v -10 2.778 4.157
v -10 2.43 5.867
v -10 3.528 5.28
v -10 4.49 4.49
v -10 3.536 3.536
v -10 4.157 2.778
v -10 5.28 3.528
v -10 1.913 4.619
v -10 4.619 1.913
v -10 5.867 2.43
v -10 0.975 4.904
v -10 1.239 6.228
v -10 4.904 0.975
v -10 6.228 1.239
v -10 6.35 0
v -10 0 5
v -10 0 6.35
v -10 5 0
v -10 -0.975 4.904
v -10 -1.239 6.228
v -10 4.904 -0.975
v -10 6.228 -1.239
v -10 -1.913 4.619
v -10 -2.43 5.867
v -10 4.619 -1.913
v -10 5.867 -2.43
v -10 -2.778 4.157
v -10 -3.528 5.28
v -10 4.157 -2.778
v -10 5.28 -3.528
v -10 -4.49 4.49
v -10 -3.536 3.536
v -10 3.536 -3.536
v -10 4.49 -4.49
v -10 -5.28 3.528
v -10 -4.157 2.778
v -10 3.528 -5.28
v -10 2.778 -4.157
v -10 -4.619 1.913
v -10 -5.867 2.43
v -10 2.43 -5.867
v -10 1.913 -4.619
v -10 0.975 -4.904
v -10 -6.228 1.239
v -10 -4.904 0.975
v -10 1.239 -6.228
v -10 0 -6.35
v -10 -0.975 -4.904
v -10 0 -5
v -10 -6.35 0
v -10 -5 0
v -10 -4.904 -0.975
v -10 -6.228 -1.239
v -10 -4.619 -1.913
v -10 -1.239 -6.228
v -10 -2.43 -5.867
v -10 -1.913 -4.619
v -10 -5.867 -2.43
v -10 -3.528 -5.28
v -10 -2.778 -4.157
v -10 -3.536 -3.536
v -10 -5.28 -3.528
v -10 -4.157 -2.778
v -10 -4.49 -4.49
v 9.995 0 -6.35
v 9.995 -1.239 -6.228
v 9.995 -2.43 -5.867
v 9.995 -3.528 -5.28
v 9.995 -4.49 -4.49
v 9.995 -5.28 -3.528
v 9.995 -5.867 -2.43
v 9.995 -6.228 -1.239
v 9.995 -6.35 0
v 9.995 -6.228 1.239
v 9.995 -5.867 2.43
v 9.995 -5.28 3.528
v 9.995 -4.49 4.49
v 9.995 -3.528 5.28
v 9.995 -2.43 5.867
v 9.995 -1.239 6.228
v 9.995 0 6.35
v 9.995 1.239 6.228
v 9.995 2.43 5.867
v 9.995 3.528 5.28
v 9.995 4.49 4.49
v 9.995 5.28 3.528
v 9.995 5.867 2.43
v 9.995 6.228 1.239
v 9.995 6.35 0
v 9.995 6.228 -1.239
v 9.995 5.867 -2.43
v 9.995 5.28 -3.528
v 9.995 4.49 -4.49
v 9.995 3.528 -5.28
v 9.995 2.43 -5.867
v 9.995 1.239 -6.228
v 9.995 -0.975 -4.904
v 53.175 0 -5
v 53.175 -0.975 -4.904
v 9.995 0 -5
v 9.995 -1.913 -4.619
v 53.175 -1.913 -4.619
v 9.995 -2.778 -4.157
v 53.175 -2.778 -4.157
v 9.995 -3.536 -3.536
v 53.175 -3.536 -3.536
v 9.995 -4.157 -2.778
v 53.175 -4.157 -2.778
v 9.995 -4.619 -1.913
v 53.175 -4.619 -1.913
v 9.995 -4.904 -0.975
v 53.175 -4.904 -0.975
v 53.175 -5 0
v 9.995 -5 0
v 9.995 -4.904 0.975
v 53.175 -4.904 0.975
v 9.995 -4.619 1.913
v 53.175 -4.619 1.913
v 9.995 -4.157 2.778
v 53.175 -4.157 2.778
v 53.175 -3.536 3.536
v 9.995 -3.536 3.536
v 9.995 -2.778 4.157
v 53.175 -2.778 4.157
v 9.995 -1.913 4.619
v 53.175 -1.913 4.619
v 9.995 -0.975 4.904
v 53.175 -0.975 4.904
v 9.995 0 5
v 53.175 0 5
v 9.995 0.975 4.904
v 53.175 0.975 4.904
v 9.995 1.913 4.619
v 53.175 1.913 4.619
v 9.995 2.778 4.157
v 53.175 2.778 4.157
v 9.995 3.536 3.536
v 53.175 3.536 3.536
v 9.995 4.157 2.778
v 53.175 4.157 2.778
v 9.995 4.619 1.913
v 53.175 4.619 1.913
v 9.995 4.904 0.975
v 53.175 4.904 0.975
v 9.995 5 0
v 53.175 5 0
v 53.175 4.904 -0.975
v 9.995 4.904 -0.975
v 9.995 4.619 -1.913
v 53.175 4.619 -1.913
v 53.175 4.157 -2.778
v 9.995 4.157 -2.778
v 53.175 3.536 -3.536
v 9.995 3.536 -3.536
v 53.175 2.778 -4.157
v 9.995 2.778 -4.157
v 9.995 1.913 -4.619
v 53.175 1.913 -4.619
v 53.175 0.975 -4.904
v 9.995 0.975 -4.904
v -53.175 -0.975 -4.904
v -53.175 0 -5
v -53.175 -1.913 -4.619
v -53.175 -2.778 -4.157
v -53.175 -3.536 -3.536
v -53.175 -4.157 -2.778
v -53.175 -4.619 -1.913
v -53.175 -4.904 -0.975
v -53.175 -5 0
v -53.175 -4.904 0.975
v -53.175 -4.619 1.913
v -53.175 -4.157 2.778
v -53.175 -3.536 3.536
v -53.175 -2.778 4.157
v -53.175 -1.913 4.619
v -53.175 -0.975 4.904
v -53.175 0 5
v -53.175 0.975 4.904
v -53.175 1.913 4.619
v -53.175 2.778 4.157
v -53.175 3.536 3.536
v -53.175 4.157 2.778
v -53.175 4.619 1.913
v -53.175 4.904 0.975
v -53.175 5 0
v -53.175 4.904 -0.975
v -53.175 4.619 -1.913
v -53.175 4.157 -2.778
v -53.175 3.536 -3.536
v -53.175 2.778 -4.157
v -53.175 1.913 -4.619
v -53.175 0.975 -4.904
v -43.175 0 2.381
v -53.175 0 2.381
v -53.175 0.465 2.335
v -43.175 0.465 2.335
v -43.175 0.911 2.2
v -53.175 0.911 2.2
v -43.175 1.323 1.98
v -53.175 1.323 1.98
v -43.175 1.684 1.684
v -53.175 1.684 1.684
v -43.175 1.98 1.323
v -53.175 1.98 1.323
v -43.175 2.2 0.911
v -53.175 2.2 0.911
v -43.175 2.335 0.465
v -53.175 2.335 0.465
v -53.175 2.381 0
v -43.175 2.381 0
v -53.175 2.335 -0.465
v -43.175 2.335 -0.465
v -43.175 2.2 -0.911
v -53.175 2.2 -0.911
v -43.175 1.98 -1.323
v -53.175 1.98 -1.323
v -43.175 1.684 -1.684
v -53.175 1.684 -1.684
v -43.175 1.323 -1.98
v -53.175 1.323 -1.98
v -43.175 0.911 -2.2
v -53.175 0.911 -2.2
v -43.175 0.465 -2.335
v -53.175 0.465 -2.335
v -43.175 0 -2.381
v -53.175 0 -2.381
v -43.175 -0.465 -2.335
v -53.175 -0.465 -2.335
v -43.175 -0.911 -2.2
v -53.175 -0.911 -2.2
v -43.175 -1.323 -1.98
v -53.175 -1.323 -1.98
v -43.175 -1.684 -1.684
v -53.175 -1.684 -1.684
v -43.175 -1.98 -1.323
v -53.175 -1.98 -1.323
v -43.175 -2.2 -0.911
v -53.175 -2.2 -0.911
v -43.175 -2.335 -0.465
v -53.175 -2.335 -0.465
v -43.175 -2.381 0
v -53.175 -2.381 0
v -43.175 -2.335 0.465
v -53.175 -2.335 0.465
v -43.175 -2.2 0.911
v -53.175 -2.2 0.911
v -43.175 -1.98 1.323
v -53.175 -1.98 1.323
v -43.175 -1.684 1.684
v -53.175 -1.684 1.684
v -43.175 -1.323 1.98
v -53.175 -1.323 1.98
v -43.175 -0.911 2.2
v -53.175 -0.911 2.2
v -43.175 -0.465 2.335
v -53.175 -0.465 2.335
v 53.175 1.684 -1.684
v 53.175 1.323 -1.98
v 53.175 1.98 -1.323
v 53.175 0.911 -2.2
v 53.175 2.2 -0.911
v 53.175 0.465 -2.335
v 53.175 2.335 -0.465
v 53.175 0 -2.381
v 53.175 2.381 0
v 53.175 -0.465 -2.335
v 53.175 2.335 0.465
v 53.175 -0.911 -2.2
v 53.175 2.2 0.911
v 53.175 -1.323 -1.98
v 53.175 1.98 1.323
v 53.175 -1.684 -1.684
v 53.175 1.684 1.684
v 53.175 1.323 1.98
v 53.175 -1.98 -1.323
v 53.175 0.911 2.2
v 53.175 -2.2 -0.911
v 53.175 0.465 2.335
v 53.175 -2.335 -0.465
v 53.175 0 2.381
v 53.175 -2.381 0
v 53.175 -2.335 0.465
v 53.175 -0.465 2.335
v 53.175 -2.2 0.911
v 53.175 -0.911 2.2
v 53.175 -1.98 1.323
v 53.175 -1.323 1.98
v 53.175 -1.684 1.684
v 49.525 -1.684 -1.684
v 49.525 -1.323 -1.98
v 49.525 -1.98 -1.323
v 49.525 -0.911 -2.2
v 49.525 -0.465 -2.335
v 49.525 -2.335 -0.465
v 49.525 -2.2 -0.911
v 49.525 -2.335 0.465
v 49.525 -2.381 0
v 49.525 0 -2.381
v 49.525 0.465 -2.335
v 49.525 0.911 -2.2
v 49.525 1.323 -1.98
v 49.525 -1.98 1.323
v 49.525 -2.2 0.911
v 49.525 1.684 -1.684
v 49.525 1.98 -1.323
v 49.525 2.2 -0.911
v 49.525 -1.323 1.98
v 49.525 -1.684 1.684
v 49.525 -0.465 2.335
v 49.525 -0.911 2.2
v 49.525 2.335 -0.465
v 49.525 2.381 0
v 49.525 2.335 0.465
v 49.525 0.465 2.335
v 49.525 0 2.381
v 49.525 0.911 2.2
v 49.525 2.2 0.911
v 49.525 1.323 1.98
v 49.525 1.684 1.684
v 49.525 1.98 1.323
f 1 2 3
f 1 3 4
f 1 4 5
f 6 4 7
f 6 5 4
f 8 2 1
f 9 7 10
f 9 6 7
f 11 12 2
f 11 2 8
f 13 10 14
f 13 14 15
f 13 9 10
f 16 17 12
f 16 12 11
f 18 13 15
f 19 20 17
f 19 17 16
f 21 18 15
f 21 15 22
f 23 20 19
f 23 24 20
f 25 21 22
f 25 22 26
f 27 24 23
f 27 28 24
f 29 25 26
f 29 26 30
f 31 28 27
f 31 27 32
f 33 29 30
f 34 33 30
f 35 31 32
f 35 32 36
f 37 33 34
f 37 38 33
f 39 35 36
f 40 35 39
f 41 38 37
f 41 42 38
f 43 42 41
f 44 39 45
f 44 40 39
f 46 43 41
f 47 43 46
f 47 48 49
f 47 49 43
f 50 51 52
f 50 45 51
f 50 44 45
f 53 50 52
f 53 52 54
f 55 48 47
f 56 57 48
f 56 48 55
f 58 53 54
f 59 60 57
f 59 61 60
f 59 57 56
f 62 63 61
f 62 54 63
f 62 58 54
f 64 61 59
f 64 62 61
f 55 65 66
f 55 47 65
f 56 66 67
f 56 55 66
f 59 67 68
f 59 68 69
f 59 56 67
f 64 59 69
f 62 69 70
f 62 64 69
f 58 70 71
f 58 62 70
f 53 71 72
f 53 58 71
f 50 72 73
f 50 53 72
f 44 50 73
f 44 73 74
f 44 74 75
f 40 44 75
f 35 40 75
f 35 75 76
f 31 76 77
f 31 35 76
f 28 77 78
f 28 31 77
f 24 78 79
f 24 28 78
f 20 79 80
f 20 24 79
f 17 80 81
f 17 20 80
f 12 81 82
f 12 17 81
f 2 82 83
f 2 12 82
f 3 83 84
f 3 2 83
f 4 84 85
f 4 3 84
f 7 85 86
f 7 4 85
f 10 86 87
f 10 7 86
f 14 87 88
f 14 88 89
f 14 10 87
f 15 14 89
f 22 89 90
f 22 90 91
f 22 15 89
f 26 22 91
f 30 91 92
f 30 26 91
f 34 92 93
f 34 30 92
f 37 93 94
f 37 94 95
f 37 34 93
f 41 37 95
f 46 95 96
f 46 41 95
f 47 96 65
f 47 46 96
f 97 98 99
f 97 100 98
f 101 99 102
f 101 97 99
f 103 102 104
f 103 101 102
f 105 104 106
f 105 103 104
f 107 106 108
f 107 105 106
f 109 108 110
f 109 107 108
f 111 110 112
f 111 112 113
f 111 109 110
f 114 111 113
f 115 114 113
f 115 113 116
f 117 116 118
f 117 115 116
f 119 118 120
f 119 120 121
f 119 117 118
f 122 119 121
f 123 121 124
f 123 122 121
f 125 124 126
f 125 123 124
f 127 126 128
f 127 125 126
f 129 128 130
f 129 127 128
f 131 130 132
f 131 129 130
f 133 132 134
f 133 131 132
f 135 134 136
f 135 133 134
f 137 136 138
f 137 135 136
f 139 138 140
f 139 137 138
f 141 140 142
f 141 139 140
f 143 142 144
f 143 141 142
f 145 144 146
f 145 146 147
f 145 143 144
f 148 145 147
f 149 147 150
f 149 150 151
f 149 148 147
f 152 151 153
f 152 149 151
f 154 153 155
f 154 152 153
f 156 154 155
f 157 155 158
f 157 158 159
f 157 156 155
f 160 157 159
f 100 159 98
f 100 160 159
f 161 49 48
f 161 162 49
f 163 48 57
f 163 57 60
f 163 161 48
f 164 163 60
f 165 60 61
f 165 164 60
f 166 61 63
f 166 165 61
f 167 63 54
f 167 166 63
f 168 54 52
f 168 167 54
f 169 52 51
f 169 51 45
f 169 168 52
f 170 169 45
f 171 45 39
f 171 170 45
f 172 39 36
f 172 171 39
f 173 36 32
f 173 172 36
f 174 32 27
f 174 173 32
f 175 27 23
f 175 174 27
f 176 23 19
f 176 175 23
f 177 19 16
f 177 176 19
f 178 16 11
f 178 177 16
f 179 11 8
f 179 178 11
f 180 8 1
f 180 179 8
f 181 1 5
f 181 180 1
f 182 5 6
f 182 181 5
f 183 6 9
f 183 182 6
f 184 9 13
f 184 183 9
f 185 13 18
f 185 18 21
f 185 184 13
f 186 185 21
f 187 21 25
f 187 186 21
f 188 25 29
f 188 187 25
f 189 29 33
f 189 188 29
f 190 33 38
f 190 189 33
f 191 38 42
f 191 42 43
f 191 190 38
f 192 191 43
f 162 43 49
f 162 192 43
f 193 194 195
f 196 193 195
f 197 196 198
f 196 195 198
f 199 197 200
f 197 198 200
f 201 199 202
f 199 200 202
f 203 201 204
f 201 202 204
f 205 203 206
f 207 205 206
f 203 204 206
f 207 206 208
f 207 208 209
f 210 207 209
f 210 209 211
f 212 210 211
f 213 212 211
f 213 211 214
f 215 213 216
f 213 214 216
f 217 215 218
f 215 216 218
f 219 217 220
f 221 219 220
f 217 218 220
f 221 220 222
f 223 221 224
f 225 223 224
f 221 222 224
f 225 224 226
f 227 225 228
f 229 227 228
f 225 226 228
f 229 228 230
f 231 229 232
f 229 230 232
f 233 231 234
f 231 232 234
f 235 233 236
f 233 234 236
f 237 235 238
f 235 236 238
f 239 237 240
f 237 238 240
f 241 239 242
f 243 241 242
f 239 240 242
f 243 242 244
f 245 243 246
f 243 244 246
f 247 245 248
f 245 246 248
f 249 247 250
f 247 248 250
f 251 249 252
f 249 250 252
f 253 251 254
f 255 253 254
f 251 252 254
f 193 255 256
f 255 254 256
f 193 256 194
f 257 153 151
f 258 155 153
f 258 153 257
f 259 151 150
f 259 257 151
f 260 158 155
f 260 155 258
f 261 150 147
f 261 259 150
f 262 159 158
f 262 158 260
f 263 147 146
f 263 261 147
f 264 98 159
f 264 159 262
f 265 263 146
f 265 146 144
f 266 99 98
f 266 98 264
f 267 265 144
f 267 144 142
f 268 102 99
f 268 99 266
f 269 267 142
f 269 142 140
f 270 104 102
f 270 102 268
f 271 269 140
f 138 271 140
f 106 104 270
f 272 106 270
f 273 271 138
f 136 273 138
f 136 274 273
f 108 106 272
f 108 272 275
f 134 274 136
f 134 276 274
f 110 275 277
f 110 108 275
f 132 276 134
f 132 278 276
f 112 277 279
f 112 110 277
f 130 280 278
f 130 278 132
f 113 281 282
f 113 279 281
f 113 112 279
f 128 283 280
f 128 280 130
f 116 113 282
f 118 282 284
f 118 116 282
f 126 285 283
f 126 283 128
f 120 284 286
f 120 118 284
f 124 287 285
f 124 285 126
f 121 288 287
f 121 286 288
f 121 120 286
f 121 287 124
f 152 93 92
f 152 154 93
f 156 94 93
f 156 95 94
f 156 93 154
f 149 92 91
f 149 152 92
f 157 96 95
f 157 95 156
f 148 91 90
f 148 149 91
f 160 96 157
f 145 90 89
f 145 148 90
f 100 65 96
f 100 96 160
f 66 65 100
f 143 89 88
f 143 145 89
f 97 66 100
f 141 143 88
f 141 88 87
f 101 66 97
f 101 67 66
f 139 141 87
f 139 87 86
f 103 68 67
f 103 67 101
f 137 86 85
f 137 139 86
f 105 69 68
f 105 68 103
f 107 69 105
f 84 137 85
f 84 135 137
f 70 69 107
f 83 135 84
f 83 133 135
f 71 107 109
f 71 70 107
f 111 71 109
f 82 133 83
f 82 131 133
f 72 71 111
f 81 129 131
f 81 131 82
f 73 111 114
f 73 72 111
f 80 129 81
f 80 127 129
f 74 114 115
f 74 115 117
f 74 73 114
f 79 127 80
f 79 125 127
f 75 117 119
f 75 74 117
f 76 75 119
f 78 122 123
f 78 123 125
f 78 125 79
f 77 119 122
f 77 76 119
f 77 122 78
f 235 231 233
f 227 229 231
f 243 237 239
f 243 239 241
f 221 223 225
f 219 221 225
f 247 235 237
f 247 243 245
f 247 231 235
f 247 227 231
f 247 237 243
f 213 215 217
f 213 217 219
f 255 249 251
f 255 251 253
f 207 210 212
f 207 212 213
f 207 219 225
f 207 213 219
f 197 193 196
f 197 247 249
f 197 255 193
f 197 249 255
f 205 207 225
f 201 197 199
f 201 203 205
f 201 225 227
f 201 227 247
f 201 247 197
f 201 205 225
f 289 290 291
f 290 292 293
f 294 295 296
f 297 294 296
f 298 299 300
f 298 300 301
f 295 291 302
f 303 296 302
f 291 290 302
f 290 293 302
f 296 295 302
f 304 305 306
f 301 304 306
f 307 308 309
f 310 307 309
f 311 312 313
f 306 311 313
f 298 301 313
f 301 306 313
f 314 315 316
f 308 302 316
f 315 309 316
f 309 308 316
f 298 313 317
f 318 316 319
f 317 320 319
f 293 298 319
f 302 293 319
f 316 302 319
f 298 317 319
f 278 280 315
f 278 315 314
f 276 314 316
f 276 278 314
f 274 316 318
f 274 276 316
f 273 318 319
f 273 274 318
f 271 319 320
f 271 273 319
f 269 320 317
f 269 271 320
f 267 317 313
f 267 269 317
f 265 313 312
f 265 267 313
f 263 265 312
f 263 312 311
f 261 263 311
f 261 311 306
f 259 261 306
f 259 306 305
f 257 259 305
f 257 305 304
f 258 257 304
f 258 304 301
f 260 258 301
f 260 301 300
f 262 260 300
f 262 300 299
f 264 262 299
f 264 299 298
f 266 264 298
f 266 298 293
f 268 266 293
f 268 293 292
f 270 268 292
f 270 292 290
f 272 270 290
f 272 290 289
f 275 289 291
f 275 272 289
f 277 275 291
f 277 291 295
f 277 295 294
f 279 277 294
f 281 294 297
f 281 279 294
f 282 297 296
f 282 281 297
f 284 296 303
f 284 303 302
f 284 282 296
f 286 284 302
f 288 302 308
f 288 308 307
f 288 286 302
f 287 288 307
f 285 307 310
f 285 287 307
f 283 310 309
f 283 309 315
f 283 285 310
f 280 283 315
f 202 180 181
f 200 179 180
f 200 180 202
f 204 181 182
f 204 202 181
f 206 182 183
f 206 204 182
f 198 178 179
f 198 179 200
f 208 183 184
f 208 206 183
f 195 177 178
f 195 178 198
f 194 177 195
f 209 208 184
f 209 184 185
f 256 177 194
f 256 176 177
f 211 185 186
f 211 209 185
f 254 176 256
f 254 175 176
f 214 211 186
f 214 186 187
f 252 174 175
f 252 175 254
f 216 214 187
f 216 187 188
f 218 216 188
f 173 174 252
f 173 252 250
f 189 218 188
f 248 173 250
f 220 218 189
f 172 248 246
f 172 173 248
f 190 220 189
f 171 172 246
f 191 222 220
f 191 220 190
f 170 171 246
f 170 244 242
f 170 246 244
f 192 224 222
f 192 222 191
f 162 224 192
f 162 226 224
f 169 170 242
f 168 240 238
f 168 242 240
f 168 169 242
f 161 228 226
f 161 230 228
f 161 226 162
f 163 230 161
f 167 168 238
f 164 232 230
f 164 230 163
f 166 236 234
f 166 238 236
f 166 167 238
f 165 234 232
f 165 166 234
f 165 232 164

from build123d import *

# Parameters (mm, degrees)
CROQUIS2_R            = 2.38125
CORTAR_EXTRUIR1_DEPTH = 10


with BuildPart() as part:
    # Croquis1 → Revolución1 (revolve)
    with BuildSketch(Plane(origin=(0, 0, 0), x_dir=(1, 0, 0), z_dir=(0, 1, 0))):
        Polygon((9.995, 6.35), (-10, 6.35), (-10, 5), (-53.175, 5), (-53.175, 0), (53.175, 0), (53.175, 5), (9.995, 5), align=None)
    revolve(axis=Axis((53.175, 0, 0), (-1, 0, 0)))

    # Croquis2 → Cortar-Extruir1 (cut)
    with BuildSketch(Plane.ZY.offset(53.175)):
        Circle(CROQUIS2_R)
    cortar_extruir1 = extrude(amount=-CORTAR_EXTRUIR1_DEPTH, mode=Mode.SUBTRACT)

    # Simetría1: Cortar-Extruir1 across plane
    add(cortar_extruir1.mirror(Plane.ZY.offset(-3.175)), mode=Mode.SUBTRACT)


solid = part.part
